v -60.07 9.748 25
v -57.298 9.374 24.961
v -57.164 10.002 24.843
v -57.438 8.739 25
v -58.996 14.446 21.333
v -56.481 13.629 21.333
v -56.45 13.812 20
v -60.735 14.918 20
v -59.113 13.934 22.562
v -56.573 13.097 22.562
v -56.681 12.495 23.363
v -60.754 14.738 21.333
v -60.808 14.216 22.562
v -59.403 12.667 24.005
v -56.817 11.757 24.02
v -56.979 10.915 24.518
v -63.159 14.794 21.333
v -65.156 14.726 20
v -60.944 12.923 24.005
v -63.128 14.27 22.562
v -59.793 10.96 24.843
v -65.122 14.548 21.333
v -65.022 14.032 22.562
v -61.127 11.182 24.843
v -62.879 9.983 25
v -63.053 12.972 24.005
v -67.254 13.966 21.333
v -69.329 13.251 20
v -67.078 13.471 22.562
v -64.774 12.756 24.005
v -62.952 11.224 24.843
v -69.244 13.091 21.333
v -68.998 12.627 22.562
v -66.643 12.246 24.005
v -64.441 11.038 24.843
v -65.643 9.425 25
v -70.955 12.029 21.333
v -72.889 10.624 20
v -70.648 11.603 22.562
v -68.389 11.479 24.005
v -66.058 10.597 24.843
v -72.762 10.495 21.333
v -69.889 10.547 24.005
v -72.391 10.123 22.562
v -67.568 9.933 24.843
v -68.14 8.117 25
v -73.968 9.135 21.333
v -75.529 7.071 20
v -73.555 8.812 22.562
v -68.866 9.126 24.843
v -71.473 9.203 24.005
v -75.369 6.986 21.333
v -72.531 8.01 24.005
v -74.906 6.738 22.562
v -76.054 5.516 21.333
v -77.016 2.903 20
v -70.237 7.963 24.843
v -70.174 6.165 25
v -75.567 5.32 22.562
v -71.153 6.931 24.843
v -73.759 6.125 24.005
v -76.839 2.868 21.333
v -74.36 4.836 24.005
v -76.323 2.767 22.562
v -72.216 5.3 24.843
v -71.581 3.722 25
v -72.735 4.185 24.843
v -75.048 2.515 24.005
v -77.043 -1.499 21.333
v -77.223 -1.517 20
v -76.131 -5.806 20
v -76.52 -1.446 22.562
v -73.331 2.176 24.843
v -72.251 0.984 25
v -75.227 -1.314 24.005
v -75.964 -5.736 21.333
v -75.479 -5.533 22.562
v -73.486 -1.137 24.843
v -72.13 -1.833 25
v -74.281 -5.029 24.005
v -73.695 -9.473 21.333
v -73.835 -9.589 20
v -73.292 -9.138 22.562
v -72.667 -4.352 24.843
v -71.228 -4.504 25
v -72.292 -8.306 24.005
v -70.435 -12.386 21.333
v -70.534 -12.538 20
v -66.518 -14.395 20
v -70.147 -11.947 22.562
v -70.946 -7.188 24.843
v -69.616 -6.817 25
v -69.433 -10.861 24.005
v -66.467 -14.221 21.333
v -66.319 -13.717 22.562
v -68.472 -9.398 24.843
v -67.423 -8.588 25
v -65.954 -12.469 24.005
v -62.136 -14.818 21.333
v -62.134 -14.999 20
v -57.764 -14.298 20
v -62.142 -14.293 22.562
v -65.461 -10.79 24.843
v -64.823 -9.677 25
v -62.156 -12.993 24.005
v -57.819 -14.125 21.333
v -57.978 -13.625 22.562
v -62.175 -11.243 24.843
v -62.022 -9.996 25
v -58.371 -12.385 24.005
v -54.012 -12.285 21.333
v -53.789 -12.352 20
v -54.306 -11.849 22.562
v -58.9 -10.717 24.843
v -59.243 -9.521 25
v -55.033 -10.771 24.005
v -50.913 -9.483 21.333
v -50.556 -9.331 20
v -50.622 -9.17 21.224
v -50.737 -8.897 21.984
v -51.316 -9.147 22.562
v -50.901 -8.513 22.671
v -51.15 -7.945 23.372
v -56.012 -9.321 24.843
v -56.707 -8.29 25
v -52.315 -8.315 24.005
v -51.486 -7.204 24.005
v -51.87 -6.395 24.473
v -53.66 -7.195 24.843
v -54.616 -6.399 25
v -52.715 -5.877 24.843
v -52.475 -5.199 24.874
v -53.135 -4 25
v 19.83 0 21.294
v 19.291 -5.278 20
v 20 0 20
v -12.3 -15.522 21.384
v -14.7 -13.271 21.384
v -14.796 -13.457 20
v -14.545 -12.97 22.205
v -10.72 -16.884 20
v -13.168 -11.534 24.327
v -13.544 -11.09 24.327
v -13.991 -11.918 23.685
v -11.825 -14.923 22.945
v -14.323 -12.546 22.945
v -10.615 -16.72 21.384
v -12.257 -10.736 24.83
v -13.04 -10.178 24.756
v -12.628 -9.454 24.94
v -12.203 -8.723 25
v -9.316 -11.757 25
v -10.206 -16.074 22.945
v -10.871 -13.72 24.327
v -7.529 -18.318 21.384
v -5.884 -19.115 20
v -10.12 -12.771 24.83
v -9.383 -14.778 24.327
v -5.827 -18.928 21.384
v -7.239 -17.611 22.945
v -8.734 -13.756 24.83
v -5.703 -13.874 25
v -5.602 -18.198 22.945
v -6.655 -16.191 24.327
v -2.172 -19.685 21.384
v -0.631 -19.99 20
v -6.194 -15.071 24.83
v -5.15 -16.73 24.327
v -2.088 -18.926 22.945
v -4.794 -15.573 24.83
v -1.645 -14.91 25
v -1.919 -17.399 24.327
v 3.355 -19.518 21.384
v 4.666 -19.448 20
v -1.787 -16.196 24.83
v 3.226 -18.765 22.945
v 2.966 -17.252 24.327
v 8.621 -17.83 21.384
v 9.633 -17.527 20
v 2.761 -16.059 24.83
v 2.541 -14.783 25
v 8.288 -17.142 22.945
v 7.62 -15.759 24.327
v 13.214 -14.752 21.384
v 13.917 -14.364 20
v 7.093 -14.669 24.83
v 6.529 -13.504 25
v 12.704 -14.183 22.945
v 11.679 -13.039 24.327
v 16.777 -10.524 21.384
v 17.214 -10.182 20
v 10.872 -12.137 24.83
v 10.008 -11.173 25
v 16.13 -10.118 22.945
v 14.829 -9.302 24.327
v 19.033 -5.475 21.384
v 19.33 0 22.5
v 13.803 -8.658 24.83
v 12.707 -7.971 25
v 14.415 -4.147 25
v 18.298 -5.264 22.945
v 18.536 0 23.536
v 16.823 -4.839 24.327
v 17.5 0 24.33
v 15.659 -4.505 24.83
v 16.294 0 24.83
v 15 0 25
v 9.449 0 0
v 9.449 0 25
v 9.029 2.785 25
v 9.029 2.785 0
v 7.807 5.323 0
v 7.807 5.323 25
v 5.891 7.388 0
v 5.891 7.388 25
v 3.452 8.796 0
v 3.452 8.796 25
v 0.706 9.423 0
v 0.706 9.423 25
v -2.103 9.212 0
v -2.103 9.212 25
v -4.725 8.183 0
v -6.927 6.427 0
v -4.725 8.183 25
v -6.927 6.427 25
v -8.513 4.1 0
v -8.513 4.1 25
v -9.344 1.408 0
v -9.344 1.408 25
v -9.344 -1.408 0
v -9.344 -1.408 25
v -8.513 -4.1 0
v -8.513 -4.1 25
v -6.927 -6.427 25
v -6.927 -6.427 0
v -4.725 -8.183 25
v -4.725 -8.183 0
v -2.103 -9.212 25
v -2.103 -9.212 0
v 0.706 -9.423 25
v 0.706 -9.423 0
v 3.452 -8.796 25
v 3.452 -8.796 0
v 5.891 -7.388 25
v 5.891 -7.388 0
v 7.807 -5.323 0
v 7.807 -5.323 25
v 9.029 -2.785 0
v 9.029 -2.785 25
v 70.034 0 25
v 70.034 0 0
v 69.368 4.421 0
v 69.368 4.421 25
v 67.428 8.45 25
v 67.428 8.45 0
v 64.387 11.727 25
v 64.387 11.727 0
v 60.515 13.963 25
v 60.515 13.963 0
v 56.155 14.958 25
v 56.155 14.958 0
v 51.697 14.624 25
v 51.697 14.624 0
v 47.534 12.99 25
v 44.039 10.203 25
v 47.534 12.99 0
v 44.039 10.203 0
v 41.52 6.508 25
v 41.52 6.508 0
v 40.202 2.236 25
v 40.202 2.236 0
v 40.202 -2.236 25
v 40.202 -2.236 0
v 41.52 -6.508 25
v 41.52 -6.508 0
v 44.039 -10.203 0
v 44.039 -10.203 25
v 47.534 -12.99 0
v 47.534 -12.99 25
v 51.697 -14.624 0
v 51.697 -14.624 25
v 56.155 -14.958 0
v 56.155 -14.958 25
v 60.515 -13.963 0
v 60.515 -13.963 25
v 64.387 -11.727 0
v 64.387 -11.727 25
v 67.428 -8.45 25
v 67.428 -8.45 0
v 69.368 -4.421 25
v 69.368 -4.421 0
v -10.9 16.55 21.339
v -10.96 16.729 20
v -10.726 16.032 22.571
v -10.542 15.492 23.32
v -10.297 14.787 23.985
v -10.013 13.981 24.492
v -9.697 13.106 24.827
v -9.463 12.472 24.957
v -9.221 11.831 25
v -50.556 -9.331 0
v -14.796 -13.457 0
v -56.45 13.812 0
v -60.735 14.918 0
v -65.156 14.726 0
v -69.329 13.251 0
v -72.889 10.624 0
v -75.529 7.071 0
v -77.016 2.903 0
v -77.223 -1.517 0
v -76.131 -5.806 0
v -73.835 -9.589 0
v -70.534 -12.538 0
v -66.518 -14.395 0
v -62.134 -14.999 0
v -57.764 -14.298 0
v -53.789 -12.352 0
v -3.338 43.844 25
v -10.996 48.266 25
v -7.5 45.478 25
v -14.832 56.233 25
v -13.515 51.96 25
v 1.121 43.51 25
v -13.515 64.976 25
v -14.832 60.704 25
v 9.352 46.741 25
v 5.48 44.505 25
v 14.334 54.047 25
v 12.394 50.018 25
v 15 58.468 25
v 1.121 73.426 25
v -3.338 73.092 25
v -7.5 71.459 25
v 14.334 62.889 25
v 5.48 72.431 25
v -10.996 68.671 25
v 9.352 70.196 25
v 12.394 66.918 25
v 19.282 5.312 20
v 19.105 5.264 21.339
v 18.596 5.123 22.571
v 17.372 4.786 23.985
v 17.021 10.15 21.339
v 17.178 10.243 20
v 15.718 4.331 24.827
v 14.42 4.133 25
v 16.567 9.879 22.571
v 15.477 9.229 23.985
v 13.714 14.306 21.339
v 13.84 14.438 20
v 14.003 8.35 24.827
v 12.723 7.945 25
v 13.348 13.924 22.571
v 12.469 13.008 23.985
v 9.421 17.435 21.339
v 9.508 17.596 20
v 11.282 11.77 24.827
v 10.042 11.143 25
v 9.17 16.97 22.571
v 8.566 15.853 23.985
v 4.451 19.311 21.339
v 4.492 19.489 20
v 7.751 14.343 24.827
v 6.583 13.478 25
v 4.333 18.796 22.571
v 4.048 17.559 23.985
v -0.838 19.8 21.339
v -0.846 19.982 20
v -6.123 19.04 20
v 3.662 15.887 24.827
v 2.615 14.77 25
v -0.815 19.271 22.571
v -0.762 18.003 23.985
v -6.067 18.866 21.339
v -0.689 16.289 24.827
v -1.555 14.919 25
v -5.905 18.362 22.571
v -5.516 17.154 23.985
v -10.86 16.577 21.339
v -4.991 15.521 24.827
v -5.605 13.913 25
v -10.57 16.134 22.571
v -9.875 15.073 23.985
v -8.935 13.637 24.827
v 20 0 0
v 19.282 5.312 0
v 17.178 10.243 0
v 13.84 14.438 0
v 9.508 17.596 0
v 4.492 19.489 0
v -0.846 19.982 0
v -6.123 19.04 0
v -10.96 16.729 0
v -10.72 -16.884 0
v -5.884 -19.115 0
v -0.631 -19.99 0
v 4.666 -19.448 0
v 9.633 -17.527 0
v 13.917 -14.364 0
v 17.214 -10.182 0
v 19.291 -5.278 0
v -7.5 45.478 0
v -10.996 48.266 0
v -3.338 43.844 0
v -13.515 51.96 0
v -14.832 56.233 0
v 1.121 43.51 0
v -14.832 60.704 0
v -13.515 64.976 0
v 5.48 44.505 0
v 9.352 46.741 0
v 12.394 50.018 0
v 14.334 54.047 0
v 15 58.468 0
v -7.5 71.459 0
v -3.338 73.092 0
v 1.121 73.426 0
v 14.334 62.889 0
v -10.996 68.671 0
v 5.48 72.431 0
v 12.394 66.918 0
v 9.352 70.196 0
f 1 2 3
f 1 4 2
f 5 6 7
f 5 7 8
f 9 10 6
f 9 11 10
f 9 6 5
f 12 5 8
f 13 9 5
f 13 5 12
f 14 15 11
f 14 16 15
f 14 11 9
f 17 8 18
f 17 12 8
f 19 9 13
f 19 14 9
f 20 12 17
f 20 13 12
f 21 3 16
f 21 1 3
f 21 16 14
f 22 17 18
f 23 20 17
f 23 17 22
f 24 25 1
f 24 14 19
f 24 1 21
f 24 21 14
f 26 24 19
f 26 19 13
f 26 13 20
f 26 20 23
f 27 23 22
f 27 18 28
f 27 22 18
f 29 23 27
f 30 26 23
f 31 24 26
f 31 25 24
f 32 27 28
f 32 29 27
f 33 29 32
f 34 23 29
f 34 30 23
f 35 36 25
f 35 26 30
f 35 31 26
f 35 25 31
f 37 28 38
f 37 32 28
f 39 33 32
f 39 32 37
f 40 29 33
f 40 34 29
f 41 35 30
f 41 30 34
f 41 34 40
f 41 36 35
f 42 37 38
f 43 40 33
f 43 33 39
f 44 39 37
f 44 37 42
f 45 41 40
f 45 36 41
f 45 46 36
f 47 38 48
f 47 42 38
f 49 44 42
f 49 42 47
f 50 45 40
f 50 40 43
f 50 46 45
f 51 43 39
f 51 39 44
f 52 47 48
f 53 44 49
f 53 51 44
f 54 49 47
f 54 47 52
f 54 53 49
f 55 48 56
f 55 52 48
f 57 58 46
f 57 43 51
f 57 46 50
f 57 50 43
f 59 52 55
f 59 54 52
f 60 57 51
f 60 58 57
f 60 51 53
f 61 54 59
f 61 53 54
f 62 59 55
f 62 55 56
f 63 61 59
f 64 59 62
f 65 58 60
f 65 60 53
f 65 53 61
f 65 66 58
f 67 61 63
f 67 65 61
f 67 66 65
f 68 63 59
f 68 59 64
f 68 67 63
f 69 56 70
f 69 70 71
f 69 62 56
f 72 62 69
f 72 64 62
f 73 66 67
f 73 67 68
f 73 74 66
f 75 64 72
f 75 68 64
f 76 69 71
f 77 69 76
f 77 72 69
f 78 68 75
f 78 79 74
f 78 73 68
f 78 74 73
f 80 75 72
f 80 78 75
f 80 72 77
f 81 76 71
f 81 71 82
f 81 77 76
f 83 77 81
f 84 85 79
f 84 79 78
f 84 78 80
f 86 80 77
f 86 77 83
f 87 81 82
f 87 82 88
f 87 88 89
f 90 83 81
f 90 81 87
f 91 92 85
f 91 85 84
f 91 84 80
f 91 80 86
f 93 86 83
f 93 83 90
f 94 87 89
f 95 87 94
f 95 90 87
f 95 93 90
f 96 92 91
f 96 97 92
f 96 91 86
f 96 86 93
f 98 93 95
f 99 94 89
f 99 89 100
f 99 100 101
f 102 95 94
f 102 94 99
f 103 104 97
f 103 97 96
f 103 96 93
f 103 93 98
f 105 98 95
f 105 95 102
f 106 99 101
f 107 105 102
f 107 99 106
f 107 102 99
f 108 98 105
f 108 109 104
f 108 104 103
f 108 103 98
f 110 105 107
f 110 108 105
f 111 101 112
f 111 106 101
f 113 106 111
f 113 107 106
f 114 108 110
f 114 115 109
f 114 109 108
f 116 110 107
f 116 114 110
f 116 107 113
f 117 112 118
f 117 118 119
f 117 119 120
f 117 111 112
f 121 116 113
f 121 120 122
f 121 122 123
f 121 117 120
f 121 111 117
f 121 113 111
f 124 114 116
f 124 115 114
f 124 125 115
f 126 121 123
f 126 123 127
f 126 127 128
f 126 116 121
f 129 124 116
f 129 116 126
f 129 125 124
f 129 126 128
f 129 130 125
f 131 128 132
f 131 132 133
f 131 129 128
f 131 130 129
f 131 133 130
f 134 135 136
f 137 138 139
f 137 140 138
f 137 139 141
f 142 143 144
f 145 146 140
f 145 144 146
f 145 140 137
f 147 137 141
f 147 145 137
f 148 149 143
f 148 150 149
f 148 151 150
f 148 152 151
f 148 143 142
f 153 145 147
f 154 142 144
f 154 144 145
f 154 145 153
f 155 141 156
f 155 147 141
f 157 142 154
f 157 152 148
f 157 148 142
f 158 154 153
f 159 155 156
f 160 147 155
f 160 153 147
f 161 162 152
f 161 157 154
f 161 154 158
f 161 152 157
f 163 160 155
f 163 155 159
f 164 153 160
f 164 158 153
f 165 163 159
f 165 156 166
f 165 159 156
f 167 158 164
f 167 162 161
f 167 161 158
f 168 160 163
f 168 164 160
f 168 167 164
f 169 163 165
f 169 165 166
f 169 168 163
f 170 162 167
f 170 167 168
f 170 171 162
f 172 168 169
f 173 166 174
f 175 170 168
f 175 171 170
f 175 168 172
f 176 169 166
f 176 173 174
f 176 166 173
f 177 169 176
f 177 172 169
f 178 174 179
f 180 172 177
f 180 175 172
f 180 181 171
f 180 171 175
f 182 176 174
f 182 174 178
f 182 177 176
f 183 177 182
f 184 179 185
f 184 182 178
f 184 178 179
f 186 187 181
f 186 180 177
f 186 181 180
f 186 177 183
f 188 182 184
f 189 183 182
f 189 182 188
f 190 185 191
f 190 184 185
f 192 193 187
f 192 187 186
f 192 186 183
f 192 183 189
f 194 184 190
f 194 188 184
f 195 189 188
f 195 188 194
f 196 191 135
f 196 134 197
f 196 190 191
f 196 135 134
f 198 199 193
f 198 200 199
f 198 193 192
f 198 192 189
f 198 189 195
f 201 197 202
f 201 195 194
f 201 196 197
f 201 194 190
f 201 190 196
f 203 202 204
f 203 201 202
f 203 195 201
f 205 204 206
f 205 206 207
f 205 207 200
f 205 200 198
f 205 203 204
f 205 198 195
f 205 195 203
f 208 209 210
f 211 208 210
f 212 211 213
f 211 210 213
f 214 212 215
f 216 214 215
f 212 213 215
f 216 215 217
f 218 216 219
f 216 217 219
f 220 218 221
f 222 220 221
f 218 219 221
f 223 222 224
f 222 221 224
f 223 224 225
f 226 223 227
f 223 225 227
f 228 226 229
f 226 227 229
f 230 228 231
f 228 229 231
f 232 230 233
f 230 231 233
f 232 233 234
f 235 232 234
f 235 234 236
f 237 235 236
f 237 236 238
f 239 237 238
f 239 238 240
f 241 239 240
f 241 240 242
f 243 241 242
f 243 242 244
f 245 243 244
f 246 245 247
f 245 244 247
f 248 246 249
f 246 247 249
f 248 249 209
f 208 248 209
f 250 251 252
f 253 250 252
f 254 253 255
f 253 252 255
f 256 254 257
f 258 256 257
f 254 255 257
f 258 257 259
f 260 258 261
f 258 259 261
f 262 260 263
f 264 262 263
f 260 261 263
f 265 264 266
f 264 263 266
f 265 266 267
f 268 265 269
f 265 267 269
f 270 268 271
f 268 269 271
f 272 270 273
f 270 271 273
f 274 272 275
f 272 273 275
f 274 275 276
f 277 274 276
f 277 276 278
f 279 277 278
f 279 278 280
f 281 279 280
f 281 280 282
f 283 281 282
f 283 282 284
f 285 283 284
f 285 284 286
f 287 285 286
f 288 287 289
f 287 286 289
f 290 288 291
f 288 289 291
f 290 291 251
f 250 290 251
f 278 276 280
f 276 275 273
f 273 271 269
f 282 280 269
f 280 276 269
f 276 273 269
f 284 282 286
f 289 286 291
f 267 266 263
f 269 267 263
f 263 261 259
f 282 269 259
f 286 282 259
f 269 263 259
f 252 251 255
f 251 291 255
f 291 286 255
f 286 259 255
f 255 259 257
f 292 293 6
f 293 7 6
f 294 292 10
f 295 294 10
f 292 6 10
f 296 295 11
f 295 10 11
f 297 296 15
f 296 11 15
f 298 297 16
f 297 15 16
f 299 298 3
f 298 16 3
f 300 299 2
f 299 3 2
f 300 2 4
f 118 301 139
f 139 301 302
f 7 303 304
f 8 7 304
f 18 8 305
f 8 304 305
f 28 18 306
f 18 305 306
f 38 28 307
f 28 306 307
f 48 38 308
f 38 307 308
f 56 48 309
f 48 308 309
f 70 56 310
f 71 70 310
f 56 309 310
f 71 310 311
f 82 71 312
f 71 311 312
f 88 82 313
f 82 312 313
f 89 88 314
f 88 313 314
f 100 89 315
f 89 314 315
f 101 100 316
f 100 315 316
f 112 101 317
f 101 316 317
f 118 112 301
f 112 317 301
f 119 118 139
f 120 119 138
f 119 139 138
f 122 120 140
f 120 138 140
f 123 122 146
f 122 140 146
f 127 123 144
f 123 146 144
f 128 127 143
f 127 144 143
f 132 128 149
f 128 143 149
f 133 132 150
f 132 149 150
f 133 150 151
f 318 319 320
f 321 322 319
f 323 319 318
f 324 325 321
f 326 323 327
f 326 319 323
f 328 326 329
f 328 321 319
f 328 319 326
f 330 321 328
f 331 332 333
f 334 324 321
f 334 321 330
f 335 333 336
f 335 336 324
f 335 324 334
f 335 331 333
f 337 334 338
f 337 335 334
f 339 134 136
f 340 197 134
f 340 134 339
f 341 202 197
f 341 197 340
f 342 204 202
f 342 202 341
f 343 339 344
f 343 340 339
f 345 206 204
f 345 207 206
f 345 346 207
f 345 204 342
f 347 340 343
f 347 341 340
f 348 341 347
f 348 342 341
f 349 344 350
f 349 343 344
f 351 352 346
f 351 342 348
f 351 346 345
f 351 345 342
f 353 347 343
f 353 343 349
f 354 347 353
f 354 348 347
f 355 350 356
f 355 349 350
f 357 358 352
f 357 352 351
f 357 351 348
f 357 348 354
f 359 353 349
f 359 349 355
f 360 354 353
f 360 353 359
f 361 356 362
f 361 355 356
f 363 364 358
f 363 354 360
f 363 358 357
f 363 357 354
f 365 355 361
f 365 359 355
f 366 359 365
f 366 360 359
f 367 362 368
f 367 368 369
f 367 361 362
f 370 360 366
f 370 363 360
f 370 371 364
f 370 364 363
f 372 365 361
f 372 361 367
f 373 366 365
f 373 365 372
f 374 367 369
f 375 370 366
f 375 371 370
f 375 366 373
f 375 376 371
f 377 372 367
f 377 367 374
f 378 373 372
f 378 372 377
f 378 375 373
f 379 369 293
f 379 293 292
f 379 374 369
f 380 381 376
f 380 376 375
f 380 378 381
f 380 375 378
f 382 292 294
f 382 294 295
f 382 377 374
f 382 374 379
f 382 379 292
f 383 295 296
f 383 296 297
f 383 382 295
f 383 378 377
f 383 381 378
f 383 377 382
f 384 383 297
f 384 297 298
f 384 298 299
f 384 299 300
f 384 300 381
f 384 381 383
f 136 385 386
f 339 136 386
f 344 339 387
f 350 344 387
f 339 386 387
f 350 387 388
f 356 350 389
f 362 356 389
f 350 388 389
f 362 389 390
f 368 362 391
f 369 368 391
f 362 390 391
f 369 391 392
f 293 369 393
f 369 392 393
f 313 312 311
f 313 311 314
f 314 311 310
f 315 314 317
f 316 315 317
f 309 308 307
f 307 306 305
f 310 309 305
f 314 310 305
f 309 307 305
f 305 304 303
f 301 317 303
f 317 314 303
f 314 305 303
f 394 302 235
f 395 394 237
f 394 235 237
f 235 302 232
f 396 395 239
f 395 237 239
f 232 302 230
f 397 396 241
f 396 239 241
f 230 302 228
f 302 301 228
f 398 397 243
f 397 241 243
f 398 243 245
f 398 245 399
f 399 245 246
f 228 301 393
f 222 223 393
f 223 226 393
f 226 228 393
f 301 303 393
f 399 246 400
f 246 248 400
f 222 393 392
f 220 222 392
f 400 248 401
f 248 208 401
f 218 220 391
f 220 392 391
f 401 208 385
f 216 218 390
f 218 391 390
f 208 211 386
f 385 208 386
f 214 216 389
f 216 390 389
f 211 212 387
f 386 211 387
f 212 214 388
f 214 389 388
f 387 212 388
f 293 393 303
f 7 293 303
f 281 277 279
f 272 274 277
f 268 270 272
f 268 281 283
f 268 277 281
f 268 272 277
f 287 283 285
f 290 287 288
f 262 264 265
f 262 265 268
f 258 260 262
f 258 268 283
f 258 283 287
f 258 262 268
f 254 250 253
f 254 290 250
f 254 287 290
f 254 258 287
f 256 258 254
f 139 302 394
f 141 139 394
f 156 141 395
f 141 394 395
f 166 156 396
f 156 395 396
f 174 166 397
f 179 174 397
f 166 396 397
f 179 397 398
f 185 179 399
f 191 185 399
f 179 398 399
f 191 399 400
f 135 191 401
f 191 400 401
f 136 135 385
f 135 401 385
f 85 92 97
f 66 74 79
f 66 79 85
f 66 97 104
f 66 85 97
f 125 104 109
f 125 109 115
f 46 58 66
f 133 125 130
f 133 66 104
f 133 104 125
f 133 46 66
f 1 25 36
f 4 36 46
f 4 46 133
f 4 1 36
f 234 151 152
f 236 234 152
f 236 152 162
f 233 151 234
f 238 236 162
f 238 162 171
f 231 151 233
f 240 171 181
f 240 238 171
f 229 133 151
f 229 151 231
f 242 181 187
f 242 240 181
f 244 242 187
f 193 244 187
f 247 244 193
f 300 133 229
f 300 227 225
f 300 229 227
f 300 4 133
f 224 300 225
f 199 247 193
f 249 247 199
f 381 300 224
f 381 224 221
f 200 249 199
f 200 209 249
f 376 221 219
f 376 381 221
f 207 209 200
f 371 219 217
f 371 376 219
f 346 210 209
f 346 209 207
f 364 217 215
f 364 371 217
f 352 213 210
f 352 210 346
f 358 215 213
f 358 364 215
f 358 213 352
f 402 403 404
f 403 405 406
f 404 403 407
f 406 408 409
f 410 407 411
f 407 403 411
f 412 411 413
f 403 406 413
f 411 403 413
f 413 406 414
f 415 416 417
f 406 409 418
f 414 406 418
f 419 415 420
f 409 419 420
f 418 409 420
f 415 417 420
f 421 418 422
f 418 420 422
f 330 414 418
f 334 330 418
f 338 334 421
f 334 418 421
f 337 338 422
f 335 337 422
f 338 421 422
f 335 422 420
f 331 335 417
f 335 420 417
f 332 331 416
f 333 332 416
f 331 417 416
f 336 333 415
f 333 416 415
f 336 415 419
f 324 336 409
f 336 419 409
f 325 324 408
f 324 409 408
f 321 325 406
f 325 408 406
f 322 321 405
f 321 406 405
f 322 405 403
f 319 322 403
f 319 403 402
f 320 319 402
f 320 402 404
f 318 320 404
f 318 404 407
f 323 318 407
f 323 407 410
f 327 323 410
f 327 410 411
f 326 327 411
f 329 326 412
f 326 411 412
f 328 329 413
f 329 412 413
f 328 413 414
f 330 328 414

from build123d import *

# Parameters (mm, degrees)
F0_R     = 15
F1_DEPTH = 25
F2_R     = 5
F3_R     = 9.449044
F4_DEPTH = 25


with BuildPart() as f1:
    # F0 (on Top) → F1 (new body)
    with BuildSketch(Plane.XY):
        with BuildLine():
            ThreePointArc((-14.79571, -13.456856), (7.214076, -18.653608), (20, 0))
            ThreePointArc((20, 0), (9.507766, 17.595522), (-10.960239, 16.72941))
            ThreePointArc((-10.960239, 16.72941), (-19.840486, 2.520935), (-14.79571, -13.456856))
        make_face()
        with BuildLine():
            ThreePointArc((-14.79571, -13.456856), (-19.840486, 2.520935), (-10.960239, 16.72941))
            Line((-10.960239, 16.72941), (-56.449797, 13.812218))
            ThreePointArc((-56.449797, 13.812218), (-49.794806, 8.284016), (-47.299809, 0))
            ThreePointArc((-47.299809, 0), (-48.137102, -4.94143), (-50.555506, -9.331203))
            Line((-50.555506, -9.331203), (-14.79571, -13.456856))
        make_face()
        with BuildLine():
            ThreePointArc((-47.299809, 0), (-49.794806, 8.284016), (-56.449797, 13.812218))
            ThreePointArc((-56.449797, 13.812218), (-76.83578, -3.7021), (-50.555506, -9.331203))
            ThreePointArc((-50.555506, -9.331203), (-48.137102, -4.94143), (-47.299809, 0))
        make_face()
        with Locations((0, 58.468169)):
            Circle(F0_R)
        with Locations((55.034475, 0)):
            Circle(F0_R)
    extrude(amount=F1_DEPTH)

    # F2
    f2_edges = [f1.edges().sort_by_distance(p)[0] for p in [
        (-32.675608, -11.394029, 25),
        (-76.83578, -3.7021, 25),
        (7.214076, -18.653608, 25),
        (9.507766, 17.595522, 25),
        (-33.705018, 15.270814, 25),
    ]]
    fillet(f2_edges, radius=F2_R)

    # F3 (on face) → F4 (cut)
    with BuildSketch(Plane.XY.offset(25)):
        Circle(F3_R)
    extrude(amount=-F4_DEPTH, mode=Mode.SUBTRACT)


solid = f1.part
